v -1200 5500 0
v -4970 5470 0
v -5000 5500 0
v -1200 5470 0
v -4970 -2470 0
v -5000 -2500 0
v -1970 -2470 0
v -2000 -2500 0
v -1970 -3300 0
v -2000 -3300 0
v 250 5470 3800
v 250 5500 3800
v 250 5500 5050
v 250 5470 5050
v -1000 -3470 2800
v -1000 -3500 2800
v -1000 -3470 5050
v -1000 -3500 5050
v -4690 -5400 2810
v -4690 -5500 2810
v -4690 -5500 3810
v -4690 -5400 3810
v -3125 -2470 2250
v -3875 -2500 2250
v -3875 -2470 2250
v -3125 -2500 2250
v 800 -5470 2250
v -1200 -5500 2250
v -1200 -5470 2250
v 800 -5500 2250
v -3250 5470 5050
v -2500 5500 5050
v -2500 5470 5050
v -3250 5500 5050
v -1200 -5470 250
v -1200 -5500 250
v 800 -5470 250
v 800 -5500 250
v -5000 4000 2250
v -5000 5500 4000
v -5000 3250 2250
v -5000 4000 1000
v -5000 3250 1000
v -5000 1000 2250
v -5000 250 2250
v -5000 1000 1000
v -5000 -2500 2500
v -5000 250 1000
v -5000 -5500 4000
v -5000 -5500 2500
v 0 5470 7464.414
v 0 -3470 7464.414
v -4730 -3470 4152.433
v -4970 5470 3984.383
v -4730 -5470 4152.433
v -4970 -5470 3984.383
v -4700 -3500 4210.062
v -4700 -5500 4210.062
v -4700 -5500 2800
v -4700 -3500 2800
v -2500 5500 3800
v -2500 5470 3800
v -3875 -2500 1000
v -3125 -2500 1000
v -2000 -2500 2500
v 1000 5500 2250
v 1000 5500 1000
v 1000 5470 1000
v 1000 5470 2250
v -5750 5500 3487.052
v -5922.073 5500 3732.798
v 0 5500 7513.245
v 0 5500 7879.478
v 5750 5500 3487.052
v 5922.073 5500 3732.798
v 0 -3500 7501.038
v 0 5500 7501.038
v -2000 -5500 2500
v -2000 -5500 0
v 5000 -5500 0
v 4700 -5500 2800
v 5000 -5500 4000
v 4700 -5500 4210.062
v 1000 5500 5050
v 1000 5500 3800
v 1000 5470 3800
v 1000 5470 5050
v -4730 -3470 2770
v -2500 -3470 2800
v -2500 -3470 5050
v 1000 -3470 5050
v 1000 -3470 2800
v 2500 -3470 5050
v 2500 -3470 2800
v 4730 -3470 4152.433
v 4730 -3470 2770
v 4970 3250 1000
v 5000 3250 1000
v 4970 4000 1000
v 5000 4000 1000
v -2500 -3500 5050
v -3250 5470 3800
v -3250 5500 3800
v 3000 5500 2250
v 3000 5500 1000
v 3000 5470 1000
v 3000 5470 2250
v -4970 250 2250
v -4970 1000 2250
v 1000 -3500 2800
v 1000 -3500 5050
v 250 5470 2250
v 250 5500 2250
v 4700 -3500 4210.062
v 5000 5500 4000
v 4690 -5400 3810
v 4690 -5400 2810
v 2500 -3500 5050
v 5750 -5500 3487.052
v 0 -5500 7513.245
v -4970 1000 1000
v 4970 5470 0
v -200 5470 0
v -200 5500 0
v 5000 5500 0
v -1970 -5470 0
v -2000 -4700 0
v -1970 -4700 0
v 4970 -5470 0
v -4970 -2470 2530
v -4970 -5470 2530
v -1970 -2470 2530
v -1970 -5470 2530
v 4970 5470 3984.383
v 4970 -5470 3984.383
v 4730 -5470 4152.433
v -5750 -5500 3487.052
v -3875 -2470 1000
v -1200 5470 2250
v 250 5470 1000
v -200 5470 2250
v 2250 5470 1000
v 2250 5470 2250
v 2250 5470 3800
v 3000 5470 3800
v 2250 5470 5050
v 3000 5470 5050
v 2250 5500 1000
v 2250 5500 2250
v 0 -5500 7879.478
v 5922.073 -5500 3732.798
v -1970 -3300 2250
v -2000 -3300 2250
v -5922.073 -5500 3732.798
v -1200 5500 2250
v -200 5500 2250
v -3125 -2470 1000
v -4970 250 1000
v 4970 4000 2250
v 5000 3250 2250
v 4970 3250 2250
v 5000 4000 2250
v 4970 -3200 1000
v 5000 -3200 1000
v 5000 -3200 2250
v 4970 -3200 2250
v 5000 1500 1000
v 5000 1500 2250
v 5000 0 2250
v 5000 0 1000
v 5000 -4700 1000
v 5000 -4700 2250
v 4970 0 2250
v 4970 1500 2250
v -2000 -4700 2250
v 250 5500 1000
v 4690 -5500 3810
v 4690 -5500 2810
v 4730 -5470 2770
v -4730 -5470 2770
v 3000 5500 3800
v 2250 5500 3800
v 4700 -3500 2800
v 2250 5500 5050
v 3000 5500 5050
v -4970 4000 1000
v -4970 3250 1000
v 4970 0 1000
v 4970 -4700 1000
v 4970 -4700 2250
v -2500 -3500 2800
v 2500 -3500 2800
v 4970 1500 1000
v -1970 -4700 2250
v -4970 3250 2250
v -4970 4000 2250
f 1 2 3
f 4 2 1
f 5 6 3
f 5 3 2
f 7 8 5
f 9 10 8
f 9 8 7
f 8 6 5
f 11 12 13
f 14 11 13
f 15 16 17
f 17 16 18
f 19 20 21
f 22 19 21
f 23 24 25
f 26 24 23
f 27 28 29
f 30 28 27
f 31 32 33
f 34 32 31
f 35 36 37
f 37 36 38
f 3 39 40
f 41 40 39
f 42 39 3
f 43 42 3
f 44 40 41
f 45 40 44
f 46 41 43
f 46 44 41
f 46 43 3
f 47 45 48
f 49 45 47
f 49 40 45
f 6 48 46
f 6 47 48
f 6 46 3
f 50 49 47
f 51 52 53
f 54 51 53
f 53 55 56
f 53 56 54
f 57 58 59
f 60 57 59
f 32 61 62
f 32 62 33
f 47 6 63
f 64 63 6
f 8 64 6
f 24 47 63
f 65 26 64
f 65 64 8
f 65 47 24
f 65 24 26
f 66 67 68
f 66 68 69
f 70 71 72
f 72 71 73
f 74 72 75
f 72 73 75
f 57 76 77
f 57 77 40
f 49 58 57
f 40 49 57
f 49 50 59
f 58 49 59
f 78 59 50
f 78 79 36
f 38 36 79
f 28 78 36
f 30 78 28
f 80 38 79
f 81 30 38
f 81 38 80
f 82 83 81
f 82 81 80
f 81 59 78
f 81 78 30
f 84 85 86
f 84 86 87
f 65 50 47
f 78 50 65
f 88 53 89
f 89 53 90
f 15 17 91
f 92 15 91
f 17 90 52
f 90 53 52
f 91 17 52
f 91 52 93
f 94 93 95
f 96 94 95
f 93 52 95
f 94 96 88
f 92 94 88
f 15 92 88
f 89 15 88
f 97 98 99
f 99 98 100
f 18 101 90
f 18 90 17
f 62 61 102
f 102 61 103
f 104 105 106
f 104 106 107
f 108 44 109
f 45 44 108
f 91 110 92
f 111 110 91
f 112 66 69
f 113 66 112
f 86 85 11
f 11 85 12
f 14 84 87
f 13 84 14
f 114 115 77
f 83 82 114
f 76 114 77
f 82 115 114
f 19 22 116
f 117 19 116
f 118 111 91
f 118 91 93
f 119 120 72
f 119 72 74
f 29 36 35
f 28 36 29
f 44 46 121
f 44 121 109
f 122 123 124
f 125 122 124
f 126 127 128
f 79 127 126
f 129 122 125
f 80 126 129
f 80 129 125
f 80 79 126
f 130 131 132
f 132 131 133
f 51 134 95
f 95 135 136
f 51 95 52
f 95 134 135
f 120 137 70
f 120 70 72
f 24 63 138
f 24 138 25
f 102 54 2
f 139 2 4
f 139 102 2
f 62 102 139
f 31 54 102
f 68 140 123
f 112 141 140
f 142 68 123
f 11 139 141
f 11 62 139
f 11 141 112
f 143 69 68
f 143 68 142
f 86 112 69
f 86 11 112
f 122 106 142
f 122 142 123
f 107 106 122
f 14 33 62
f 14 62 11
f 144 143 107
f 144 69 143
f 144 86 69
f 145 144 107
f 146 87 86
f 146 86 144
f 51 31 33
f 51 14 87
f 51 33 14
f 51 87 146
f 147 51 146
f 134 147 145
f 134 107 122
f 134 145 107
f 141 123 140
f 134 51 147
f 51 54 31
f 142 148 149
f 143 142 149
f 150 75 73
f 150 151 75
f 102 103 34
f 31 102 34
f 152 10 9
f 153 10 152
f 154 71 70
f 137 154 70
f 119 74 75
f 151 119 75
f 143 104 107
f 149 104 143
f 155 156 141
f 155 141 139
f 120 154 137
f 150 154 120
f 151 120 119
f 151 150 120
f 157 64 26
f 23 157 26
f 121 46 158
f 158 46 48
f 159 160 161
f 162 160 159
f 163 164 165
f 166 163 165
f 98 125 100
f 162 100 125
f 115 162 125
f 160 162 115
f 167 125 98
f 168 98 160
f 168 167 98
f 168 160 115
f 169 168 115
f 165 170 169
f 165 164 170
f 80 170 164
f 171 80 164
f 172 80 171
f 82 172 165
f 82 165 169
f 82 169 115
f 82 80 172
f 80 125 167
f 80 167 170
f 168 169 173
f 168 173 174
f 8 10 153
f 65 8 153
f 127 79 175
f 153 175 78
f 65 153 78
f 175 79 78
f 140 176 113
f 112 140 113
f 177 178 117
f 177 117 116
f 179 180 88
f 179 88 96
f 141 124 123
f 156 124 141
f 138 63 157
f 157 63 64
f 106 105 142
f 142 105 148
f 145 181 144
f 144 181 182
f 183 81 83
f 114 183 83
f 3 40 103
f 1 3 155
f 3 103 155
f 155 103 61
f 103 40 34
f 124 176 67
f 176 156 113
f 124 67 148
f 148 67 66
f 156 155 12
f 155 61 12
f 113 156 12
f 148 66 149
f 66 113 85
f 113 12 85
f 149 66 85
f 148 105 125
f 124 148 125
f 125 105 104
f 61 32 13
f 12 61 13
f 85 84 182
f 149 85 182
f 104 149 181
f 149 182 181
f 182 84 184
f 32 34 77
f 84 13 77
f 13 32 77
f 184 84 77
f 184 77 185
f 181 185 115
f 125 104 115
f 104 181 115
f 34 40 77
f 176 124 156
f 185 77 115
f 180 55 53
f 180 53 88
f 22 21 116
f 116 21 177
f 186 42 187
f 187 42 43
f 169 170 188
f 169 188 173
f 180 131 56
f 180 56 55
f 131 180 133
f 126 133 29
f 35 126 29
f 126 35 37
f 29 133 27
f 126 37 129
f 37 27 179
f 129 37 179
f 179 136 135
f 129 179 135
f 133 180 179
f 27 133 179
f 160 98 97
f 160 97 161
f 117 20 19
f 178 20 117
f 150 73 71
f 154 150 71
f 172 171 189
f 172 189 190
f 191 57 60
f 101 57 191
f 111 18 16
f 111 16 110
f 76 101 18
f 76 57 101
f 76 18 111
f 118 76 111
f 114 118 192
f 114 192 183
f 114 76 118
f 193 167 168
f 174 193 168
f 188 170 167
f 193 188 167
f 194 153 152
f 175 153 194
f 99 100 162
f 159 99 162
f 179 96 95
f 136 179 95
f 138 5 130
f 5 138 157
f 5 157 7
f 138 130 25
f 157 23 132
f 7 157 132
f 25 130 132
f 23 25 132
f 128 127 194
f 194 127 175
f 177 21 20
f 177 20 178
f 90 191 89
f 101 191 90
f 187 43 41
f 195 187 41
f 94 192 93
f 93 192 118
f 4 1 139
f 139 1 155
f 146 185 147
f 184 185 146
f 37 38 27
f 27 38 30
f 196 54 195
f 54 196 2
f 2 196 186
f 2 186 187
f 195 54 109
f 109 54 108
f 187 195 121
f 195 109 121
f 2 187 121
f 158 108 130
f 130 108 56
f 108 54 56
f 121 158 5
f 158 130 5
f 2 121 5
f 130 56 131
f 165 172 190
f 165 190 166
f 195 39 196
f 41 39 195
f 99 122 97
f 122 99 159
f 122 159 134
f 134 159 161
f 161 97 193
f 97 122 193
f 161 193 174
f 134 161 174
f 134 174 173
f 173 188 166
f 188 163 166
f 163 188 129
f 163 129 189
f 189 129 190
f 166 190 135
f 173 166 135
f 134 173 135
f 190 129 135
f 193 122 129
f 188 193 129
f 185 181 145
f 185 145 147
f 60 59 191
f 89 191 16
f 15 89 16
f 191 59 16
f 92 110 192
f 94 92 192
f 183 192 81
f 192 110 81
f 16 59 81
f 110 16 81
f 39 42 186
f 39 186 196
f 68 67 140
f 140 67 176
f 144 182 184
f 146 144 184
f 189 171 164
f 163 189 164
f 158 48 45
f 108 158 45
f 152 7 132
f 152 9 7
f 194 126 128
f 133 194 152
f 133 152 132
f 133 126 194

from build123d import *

# Parameters (mm, degrees)
F1_DEPTH      = 5500
F1_DEPTH_BACK = 5500
F2_W          = 3000
F2_H          = 2500
F3_DEPTH      = 2000
F5_DEPTH      = 5500
F5_DEPTH_BACK = 5500
F6_W          = 3000
F6_H          = 2500
F7_DEPTH      = 1000
F8_T          = -30
F9_W          = 1500
F9_H          = 2250
F10_DEPTH     = 30
F11_W         = 1400
F11_H         = 2250
F12_DEPTH     = 30
F13_W         = 2000
F13_H         = 2000
F14_DEPTH     = 30
F15_W         = 1500
F15_H         = 1250
F15_W_2       = 750
F16_DEPTH     = 30
F17_W         = 9380
F17_H         = 1000
F18_DEPTH     = 100
F19_W         = 750
F19_H         = 1250
F20_DEPTH     = 30
F21_W         = 750
F21_H         = 1250
F21_W_2       = 1000
F21_H_2       = 2250
F22_DEPTH     = 30
F23_W         = 750
F23_H         = 1250
F24_DEPTH     = 30


# Not quite as in the source:
# - a feature names something its author has since deleted; it is built from what else it names


with BuildPart() as f1:
    # F0 (on Front) → F1 (new body, two sides)
    with BuildSketch(Plane.XZ) as f1_sk:
        Polygon((-5000, 4000), (-5000, 0), (5000, 0), (5000, 4000), (0, 7501.0376910485), align=None)
    extrude(amount=F1_DEPTH)
    extrude(f1_sk.sketch, amount=-F1_DEPTH_BACK)

    # F2 (on face) → F3 (cut)
    with BuildSketch(Plane.XZ.offset(5500)):
        Polygon((4700, 4210.0622614629), (0, 7501.0376910485), (-4700, 4210.0622614629), (-4700, 2800), (4700, 2800), align=None)
        with Locations((-3500, 1250)):
            Rectangle(F2_W, F2_H)
    extrude(amount=-F3_DEPTH, mode=Mode.SUBTRACT)

    # F6 (on face) → F7 (cut)
    with BuildSketch(Plane.XZ.offset(3500)):
        with Locations((-3500, 1250)):
            Rectangle(F6_W, F6_H)
    extrude(amount=-F7_DEPTH, mode=Mode.SUBTRACT)

    # F8
    f8_openings = [f1.faces().sort_by_distance(p)[0] for p in [
        (311.881188, 356.435644, 0),
    ]]
    offset(amount=F8_T, openings=f8_openings, kind=Kind.INTERSECTION)

    # F9 (on face) → F10 (cut, through all)
    with BuildSketch(Plane.XZ.offset(3500)):
        with Locations((-1750, 3925)):
            Rectangle(F9_W, F9_H)
        with Locations((1750, 3925)):
            Rectangle(F9_W, F9_H)
    extrude(amount=-F10_DEPTH, mode=Mode.SUBTRACT)

    # F11 (on face) → F12 (cut, through all)
    with BuildSketch(Plane(origin=(-2000, 0, 0), x_dir=(0, -1, 0), z_dir=(-1, 0, 0))):
        with Locations((4000, 1125)):
            Rectangle(F11_W, F11_H)
    extrude(amount=-F12_DEPTH, mode=Mode.SUBTRACT)

    # F13 (on face) → F14 (cut, through all)
    with BuildSketch(Plane.XZ.offset(5500)):
        with Locations((-200, 1250)):
            Rectangle(F13_W, F13_H)
    extrude(amount=-F14_DEPTH, mode=Mode.SUBTRACT)

    # F15 (on face) → F16 (cut, through all)
    with BuildSketch(Plane.YZ.offset(5000)):
        with Locations((-3950, 1625)):
            Rectangle(F15_W, F15_H)
        with Locations((750, 1625)):
            Rectangle(F15_W, F15_H)
        with Locations((3625, 1625)):
            Rectangle(F15_W_2, F15_H)
    extrude(amount=-F16_DEPTH, mode=Mode.SUBTRACT)

    # F19 (on face) → F20 (cut, through all)
    with BuildSketch(Plane.XZ.offset(2500)):
        with Locations((-3500, 1625)):
            Rectangle(F19_W, F19_H)
    extrude(amount=-F20_DEPTH, mode=Mode.SUBTRACT)

    # F21 (on face) → F22 (cut, through all)
    with BuildSketch(Plane(origin=(0, 5500, 0), x_dir=(-1, 0, 0), z_dir=(0, 1, 0))):
        with Locations((-2625, 1625)):
            Rectangle(F21_W, F21_H)
        with Locations((-625, 1625)):
            Rectangle(F21_W, F21_H)
        with Locations((700, 1125)):
            Rectangle(F21_W_2, F21_H_2)
        with Locations((-2625, 4425)):
            Rectangle(F21_W, F21_H)
        with Locations((-625, 4425)):
            Rectangle(F21_W, F21_H)
        with Locations((2875, 4425)):
            Rectangle(F21_W, F21_H)
    extrude(amount=-F22_DEPTH, mode=Mode.SUBTRACT)

    # F23 (on face) → F24 (cut, through all)
    with BuildSketch(Plane(origin=(-5000, 0, 0), x_dir=(0, -1, 0), z_dir=(-1, 0, 0))):
        with Locations((-3625, 1625)):
            Rectangle(F23_W, F23_H)
        with Locations((-625, 1625)):
            Rectangle(F23_W, F23_H)
    extrude(amount=-F24_DEPTH, mode=Mode.SUBTRACT)


with BuildPart() as f5:
    # F4 (on Front) → F5 (new body, two sides)
    with BuildSketch(Plane.XZ) as f5_sk:
        Polygon((-5922.0729309053, 3732.797705517), (-5750, 3487.0520922303), (0, 7513.2454369362), (5750, 3487.0520922303), (5922.0729309053, 3732.797705517), (0, 7879.4778135646), align=None)
    extrude(amount=F5_DEPTH)
    extrude(f5_sk.sketch, amount=-F5_DEPTH_BACK)


with BuildPart() as f18:
    # F17 (on face) → F18 (new body)
    with BuildSketch(Plane.XZ.offset(5500)):
        with Locations((0, 3310)):
            Rectangle(F17_W, F17_H)
    extrude(amount=-F18_DEPTH)


solid = Compound([f1.part, f5.part, f18.part])
